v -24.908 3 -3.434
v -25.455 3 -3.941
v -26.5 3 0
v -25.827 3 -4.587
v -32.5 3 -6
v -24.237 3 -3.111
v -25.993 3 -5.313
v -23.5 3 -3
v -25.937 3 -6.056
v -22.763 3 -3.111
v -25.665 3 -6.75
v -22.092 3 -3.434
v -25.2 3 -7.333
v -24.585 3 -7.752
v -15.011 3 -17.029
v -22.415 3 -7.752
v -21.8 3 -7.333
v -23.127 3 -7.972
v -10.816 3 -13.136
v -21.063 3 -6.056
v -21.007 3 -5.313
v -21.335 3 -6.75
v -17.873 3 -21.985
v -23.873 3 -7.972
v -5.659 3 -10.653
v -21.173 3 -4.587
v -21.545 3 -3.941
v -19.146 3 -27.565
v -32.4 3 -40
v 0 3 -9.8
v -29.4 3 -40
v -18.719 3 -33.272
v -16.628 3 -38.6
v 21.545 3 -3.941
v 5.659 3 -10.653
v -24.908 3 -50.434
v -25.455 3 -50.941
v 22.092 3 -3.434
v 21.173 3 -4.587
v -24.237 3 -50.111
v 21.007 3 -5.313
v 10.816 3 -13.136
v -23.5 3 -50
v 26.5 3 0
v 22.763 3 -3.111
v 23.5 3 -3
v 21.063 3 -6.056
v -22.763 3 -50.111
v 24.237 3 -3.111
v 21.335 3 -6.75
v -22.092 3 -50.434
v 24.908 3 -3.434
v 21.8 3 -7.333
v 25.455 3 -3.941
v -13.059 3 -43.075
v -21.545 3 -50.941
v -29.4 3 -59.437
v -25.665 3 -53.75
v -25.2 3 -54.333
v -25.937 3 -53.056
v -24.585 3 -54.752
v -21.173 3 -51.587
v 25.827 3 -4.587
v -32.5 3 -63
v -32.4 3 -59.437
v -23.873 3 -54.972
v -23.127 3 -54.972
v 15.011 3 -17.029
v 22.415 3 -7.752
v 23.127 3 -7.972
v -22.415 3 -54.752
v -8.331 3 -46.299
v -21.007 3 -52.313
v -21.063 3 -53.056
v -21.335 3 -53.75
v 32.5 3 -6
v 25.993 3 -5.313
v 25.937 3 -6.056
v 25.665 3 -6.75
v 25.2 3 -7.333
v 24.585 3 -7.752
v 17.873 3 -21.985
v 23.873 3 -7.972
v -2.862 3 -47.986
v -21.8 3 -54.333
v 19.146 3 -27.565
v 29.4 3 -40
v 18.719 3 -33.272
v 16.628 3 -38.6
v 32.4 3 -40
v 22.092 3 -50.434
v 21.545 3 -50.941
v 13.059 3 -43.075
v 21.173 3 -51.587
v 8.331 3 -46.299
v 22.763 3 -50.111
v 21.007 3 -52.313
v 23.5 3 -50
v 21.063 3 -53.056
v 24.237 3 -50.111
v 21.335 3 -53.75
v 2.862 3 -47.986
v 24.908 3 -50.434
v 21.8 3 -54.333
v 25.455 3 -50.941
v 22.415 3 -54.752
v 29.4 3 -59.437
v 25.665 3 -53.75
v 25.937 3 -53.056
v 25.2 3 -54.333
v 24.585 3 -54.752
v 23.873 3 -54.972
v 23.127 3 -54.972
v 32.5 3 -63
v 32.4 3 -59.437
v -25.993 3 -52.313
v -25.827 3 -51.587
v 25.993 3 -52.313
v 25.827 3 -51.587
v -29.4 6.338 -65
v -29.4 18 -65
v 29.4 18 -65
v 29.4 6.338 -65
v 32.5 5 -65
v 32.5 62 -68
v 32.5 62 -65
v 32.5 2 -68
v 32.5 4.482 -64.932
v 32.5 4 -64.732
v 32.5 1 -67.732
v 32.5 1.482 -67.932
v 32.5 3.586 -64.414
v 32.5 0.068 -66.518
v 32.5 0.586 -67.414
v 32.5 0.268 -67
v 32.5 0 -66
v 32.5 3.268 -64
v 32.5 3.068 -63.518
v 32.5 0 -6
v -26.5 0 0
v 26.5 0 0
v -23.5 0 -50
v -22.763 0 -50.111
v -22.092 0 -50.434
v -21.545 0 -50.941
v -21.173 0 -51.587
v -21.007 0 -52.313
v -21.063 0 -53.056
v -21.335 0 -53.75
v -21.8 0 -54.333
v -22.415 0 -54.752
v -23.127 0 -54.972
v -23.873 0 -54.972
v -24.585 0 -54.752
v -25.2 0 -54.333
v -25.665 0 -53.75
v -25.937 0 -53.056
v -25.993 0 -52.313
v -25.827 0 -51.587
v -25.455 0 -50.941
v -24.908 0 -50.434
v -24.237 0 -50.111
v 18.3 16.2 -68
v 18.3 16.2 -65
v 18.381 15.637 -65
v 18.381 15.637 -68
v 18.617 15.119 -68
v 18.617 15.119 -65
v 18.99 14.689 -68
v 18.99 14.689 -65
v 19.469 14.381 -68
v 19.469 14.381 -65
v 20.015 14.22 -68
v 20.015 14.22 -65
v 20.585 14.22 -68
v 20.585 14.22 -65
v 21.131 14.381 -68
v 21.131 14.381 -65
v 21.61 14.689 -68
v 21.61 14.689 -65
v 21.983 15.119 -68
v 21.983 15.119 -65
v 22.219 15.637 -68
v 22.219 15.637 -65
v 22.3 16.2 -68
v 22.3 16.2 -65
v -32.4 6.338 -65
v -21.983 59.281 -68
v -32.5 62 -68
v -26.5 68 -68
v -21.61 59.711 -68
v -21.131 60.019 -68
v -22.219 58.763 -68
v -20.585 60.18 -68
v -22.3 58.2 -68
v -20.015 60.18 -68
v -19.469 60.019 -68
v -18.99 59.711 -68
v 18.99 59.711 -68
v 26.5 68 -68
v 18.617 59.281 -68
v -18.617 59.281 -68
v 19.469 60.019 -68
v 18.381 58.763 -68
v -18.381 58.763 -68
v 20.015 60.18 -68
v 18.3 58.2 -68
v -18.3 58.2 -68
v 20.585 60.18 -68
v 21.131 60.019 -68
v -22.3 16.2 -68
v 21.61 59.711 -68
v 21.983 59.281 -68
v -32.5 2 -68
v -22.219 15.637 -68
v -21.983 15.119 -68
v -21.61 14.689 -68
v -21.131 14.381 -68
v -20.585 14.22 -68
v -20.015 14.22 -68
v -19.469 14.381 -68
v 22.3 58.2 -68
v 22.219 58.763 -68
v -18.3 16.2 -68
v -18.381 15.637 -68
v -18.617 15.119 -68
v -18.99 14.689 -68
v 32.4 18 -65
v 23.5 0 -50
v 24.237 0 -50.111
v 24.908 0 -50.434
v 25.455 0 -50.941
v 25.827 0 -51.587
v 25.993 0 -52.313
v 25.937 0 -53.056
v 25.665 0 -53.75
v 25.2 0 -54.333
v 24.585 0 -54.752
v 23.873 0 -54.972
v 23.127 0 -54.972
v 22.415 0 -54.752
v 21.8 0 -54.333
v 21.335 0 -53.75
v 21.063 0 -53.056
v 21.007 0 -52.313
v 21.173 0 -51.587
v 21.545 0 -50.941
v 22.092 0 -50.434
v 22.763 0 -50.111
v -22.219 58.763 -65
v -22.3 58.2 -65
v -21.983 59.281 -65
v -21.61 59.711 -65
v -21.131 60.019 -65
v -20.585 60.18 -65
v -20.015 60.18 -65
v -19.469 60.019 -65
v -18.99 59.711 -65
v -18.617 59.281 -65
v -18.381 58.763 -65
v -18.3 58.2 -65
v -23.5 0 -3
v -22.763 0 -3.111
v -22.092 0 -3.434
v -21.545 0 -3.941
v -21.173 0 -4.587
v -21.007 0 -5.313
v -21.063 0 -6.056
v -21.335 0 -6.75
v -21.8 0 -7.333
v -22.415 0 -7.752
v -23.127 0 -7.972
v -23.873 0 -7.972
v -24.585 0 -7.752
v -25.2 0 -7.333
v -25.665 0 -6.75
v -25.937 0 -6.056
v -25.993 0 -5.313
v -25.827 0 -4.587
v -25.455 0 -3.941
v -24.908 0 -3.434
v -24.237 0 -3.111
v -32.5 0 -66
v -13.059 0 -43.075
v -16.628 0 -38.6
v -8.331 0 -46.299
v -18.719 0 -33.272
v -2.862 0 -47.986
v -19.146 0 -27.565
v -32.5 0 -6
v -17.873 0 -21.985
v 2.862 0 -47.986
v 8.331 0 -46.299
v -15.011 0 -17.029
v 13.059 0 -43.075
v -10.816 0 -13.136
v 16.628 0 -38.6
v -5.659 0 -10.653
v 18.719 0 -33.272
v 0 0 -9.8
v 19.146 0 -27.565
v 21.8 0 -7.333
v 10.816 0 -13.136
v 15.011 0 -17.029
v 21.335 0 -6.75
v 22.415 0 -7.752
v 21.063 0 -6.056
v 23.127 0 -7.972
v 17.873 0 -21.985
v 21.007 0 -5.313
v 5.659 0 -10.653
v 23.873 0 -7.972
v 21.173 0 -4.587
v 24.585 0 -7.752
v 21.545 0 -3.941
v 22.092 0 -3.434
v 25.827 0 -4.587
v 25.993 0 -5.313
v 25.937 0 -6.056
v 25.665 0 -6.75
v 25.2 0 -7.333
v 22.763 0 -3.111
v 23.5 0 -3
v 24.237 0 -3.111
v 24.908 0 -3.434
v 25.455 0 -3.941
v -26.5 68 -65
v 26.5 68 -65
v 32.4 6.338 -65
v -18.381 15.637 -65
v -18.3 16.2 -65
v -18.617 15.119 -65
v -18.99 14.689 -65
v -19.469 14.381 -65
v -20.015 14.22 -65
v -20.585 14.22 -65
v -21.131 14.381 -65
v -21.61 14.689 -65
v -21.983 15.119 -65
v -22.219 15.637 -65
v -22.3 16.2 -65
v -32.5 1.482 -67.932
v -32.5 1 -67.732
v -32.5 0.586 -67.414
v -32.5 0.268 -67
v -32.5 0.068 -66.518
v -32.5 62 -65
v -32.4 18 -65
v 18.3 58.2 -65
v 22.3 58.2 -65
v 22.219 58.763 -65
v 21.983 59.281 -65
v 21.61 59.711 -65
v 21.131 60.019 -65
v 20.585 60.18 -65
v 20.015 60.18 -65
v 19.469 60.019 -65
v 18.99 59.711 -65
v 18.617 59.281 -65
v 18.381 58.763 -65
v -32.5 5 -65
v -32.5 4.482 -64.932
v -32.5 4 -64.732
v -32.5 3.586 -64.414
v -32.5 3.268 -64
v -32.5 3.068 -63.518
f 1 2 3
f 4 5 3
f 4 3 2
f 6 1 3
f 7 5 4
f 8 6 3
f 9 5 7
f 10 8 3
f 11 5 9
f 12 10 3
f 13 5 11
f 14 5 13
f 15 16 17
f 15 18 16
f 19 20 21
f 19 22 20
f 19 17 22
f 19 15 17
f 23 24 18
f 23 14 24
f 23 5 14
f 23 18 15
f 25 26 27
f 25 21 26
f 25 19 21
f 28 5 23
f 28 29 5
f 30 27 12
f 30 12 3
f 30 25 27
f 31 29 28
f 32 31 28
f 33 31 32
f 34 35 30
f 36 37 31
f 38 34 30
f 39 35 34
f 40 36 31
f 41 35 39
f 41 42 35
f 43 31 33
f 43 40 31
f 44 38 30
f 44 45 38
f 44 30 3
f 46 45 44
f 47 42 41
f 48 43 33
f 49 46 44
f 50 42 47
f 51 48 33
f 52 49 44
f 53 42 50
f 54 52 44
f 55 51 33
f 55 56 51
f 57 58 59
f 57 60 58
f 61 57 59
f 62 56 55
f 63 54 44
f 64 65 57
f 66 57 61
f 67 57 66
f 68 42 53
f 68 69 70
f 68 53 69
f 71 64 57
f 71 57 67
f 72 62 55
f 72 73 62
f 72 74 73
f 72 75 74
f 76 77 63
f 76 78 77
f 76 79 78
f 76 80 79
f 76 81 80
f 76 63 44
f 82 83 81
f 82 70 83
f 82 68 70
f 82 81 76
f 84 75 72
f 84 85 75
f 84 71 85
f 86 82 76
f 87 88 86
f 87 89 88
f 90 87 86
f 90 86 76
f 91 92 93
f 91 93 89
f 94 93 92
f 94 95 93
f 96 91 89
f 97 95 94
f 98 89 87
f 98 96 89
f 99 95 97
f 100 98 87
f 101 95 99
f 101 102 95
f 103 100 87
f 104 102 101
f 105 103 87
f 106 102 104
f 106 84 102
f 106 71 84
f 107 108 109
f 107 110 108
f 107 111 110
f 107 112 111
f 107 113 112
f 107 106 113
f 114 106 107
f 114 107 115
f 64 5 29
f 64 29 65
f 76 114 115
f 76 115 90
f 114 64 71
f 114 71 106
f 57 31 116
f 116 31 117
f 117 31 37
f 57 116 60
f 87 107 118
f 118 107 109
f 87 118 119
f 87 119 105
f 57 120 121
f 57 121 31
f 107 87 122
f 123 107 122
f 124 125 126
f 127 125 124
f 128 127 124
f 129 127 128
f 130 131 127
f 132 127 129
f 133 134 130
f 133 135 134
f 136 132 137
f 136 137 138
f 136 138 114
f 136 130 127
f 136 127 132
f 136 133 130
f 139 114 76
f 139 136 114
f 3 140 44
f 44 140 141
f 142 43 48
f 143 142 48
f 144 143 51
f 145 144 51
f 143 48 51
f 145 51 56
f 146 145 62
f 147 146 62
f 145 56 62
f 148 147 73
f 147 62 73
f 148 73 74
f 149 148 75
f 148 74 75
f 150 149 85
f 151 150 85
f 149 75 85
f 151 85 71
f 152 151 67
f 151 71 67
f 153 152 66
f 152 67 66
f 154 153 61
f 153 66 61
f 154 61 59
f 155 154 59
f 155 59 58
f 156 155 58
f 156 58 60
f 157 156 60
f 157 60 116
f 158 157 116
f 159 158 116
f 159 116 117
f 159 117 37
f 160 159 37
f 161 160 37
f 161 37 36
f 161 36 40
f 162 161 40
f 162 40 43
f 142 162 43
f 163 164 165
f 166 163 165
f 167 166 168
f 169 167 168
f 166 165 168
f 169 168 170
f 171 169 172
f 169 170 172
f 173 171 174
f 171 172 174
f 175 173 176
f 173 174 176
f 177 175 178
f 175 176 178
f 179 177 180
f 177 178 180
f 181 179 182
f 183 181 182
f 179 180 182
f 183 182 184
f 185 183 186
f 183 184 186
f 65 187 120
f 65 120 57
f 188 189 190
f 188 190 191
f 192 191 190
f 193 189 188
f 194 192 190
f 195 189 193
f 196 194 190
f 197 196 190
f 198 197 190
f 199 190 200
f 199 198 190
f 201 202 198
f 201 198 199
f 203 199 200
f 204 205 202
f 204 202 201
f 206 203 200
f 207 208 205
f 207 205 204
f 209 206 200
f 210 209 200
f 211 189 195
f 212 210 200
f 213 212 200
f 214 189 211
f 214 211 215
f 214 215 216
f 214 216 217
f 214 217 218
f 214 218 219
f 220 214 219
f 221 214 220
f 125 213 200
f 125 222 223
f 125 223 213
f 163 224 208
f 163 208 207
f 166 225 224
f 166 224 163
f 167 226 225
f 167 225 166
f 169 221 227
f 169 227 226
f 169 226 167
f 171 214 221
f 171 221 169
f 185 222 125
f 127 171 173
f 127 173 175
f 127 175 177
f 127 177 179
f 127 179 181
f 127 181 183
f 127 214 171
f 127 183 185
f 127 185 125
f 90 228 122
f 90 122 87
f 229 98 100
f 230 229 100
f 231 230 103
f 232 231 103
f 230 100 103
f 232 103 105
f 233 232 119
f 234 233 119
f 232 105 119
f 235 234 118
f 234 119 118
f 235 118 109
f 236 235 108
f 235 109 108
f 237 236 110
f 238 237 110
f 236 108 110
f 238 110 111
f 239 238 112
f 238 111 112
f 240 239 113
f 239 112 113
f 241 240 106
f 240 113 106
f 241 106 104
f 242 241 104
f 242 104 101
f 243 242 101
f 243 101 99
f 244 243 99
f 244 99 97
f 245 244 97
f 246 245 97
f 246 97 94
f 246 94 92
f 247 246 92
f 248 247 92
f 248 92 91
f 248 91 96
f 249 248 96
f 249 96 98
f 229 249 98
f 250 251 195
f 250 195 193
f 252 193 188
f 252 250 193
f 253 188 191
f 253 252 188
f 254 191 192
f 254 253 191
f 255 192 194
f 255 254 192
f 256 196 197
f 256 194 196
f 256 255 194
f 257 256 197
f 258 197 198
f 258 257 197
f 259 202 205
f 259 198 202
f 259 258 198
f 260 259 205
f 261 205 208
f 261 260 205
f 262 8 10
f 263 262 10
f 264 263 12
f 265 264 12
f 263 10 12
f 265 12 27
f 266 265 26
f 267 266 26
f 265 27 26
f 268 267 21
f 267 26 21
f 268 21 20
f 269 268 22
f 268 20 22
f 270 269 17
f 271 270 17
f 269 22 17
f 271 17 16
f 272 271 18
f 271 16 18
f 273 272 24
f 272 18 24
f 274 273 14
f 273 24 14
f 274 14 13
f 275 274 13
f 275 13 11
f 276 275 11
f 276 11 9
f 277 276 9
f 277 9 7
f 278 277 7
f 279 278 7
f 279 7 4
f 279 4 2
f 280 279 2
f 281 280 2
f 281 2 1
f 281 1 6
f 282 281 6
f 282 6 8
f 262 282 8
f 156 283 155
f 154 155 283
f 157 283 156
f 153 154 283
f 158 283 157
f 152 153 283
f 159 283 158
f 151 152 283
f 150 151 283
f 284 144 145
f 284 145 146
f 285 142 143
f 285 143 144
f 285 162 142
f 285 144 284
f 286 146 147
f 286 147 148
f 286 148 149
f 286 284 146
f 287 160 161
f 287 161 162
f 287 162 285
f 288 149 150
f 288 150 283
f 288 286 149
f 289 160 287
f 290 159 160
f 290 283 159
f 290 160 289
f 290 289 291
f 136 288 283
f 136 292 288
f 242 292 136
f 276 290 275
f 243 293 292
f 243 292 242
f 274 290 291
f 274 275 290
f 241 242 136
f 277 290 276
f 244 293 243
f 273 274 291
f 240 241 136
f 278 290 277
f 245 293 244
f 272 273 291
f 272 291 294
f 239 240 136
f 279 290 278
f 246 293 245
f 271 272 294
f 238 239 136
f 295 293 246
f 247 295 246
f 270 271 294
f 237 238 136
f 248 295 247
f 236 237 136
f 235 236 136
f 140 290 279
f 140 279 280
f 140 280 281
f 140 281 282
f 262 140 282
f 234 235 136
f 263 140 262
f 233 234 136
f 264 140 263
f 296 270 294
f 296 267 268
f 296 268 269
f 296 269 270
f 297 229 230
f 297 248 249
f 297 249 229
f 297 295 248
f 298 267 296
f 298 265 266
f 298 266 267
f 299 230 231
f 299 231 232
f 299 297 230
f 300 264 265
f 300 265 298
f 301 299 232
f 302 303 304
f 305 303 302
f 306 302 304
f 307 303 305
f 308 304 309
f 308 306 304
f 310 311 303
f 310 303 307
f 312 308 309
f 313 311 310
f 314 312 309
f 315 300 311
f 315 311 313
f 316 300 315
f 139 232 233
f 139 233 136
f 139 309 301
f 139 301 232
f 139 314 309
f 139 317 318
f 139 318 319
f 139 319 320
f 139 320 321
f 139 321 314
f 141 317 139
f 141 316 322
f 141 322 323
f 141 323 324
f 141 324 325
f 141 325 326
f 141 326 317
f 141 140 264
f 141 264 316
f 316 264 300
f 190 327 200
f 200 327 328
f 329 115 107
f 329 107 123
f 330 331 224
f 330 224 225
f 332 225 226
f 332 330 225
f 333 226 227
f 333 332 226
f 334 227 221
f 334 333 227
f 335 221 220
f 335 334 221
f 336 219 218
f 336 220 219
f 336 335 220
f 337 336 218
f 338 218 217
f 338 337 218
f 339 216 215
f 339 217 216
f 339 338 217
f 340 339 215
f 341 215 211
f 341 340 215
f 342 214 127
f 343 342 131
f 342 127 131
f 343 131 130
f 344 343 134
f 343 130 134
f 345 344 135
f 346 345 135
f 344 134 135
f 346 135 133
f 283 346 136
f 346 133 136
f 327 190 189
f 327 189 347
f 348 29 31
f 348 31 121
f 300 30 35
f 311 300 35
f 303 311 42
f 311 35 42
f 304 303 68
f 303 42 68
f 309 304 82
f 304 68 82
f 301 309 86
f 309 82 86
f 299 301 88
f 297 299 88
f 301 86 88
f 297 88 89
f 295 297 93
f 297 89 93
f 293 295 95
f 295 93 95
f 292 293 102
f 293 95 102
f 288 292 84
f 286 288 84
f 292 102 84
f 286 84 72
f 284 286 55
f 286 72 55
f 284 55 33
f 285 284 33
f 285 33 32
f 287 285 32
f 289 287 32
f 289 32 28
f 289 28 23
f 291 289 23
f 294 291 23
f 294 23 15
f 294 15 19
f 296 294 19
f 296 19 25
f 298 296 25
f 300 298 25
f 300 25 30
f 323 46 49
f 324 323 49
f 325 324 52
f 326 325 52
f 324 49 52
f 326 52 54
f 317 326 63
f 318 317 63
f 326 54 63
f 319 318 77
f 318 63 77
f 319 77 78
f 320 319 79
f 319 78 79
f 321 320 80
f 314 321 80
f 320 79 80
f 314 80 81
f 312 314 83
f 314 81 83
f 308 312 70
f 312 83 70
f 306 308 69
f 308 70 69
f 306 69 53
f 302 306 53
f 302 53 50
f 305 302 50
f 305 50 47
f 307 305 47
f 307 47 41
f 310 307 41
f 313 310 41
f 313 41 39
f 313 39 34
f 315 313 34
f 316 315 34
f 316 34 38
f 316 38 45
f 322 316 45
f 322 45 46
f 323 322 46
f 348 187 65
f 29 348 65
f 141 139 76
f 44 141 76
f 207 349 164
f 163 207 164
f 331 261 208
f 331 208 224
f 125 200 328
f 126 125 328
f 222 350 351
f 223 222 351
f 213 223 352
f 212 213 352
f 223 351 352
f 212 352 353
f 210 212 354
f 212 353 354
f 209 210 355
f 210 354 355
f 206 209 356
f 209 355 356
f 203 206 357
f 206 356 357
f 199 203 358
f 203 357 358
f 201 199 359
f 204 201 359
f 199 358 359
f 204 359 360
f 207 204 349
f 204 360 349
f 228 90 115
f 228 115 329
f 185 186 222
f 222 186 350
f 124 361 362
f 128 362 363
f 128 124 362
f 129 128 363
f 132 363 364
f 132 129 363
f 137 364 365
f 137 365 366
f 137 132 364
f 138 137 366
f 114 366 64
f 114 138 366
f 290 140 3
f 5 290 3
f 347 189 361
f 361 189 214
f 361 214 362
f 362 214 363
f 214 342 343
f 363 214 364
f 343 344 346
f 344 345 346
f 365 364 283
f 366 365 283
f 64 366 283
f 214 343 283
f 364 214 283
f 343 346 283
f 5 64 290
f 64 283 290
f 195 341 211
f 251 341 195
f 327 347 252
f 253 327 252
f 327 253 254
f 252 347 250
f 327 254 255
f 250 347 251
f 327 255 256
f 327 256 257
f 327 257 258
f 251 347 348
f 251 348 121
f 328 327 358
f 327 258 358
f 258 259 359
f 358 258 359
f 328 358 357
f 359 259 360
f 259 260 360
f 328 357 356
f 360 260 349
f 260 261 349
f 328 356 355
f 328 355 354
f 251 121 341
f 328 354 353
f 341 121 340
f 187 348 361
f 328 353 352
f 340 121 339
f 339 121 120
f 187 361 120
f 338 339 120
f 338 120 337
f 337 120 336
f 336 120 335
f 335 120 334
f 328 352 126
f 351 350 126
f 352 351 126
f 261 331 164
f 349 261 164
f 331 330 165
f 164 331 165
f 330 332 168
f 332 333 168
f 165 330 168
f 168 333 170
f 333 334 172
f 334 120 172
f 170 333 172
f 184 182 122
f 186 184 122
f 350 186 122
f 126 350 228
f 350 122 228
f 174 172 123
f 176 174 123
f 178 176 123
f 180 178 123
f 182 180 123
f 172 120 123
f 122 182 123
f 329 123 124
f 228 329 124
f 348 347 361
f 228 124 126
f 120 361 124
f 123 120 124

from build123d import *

# Parameters (mm, degrees)
SKETCH1_W           = 65
SKETCH1_H           = 65
BOSS_EXTRUDE1_DEPTH = 3
SKETCH2_W           = 65
SKETCH2_H           = 3
BOSS_EXTRUDE2_DEPTH = 68
SKETCH4_R           = 19.2
CUT_EXTRUDE1_DEPTH  = 100.525122457
SKETCH5_R           = 2.5
CUT_EXTRUDE2_DEPTH  = 100.525122457
CUT_EXTRUDE3_DEPTH  = 100.525122457
BOSS_EXTRUDE3_START = -0.1
BOSS_EXTRUDE3_DEPTH = 3
BOSS_EXTRUDE4_START = -0.1
BOSS_EXTRUDE4_DEPTH = 3
FILLET1_R           = 2
CHAMFER1_SIZE       = 6


with BuildPart() as part:
    # Sketch1 → Boss-Extrude1 (new body)
    with BuildSketch(Plane(origin=(0, 0, 0), x_dir=(1, 0, 0), z_dir=(0, 1, 0))):
        with Locations((0, 32.5)):
            Rectangle(SKETCH1_W, SKETCH1_H)
    extrude(amount=BOSS_EXTRUDE1_DEPTH)

    # Sketch2 → Boss-Extrude2 (add)
    with BuildSketch(Plane.XZ):
        with Locations((0, -66.5)):
            Rectangle(SKETCH2_W, SKETCH2_H)
    extrude(amount=-BOSS_EXTRUDE2_DEPTH)

    # Sketch4 → Cut-Extrude1 (cut, through all)
    with BuildSketch(Plane(origin=(0, 3, 0), x_dir=(1, 0, 0), z_dir=(0, 1, 0))):
        with Locations(Location((0, 29, 0), (0, 0, 270))):
            Circle(SKETCH4_R)
    extrude(amount=-CUT_EXTRUDE1_DEPTH, mode=Mode.SUBTRACT)

    # Sketch5 → Cut-Extrude2 (cut, through all)
    with BuildSketch(Plane(origin=(0, 3, 0), x_dir=(1, 0, 0), z_dir=(0, 1, 0))):
        with Locations(Location((-23.5, 52.5, 0), (0, 0, 270))):
            Circle(SKETCH5_R)
        with Locations(Location((23.5, 52.5, 0), (0, 0, 270))):
            Circle(SKETCH5_R)
        with Locations(Location((23.5, 5.5, 0), (0, 0, 270))):
            Circle(SKETCH5_R)
        with Locations(Location((-23.5, 5.5, 0), (0, 0, 270))):
            Circle(SKETCH5_R)
    extrude(amount=-CUT_EXTRUDE2_DEPTH, mode=Mode.SUBTRACT)

    # Sketch6 → Cut-Extrude3 (cut, through all)
    with BuildSketch(Plane.XY.offset(-65)):
        with BuildLine():
            Line((-18.3, 58.2), (-18.3, 16.2))
            ThreePointArc((-18.3, 16.2), (-20.3, 14.2), (-22.3, 16.2))
            Line((-22.3, 16.2), (-22.3, 58.2))
            ThreePointArc((-22.3, 58.2), (-20.3, 60.2), (-18.3, 58.2))
        make_face()
        with BuildLine():
            Line((18.3, 58.2), (18.3, 16.2))
            ThreePointArc((18.3, 16.2), (20.3, 14.2), (22.3, 16.2))
            Line((22.3, 16.2), (22.3, 58.2))
            ThreePointArc((22.3, 58.2), (20.3, 60.2), (18.3, 58.2))
        make_face()
    extrude(amount=-CUT_EXTRUDE3_DEPTH, mode=Mode.SUBTRACT)

    # Sketch8 → Boss-Extrude3 (add)
    with BuildSketch(Plane.ZY.offset(32.5).offset(BOSS_EXTRUDE3_START)):
        Polygon((-40, 3), (-65, 18), (-65, 6.33809621), (-59.436506316, 3), align=None)
    extrude(amount=-BOSS_EXTRUDE3_DEPTH)

    # Sketch9 → Boss-Extrude4 (add)
    with BuildSketch(Plane(origin=(32.5, 0, 0), x_dir=(0, 0, -1), z_dir=(1, 0, 0)).offset(BOSS_EXTRUDE4_START)):
        Polygon((40, 3), (59.436506316, 3), (65, 6.33809621), (65, 18), align=None)
    extrude(amount=-BOSS_EXTRUDE4_DEPTH)

    # Fillet1
    fillet1_edges = [part.edges().sort_by_distance(p)[0] for p in [
        (0, 3, -65),
        (0, 0, -68),
    ]]
    fillet(fillet1_edges, radius=FILLET1_R)

    # Chamfer1
    chamfer1_edges = [part.edges().sort_by_distance(p)[0] for p in [
        (-32.5, 68, -66.5),
        (32.5, 68, -66.5),
        (32.5, 1.5, 0),
        (-32.5, 1.5, 0),
    ]]
    chamfer(chamfer1_edges, length=CHAMFER1_SIZE)


solid = part.part
